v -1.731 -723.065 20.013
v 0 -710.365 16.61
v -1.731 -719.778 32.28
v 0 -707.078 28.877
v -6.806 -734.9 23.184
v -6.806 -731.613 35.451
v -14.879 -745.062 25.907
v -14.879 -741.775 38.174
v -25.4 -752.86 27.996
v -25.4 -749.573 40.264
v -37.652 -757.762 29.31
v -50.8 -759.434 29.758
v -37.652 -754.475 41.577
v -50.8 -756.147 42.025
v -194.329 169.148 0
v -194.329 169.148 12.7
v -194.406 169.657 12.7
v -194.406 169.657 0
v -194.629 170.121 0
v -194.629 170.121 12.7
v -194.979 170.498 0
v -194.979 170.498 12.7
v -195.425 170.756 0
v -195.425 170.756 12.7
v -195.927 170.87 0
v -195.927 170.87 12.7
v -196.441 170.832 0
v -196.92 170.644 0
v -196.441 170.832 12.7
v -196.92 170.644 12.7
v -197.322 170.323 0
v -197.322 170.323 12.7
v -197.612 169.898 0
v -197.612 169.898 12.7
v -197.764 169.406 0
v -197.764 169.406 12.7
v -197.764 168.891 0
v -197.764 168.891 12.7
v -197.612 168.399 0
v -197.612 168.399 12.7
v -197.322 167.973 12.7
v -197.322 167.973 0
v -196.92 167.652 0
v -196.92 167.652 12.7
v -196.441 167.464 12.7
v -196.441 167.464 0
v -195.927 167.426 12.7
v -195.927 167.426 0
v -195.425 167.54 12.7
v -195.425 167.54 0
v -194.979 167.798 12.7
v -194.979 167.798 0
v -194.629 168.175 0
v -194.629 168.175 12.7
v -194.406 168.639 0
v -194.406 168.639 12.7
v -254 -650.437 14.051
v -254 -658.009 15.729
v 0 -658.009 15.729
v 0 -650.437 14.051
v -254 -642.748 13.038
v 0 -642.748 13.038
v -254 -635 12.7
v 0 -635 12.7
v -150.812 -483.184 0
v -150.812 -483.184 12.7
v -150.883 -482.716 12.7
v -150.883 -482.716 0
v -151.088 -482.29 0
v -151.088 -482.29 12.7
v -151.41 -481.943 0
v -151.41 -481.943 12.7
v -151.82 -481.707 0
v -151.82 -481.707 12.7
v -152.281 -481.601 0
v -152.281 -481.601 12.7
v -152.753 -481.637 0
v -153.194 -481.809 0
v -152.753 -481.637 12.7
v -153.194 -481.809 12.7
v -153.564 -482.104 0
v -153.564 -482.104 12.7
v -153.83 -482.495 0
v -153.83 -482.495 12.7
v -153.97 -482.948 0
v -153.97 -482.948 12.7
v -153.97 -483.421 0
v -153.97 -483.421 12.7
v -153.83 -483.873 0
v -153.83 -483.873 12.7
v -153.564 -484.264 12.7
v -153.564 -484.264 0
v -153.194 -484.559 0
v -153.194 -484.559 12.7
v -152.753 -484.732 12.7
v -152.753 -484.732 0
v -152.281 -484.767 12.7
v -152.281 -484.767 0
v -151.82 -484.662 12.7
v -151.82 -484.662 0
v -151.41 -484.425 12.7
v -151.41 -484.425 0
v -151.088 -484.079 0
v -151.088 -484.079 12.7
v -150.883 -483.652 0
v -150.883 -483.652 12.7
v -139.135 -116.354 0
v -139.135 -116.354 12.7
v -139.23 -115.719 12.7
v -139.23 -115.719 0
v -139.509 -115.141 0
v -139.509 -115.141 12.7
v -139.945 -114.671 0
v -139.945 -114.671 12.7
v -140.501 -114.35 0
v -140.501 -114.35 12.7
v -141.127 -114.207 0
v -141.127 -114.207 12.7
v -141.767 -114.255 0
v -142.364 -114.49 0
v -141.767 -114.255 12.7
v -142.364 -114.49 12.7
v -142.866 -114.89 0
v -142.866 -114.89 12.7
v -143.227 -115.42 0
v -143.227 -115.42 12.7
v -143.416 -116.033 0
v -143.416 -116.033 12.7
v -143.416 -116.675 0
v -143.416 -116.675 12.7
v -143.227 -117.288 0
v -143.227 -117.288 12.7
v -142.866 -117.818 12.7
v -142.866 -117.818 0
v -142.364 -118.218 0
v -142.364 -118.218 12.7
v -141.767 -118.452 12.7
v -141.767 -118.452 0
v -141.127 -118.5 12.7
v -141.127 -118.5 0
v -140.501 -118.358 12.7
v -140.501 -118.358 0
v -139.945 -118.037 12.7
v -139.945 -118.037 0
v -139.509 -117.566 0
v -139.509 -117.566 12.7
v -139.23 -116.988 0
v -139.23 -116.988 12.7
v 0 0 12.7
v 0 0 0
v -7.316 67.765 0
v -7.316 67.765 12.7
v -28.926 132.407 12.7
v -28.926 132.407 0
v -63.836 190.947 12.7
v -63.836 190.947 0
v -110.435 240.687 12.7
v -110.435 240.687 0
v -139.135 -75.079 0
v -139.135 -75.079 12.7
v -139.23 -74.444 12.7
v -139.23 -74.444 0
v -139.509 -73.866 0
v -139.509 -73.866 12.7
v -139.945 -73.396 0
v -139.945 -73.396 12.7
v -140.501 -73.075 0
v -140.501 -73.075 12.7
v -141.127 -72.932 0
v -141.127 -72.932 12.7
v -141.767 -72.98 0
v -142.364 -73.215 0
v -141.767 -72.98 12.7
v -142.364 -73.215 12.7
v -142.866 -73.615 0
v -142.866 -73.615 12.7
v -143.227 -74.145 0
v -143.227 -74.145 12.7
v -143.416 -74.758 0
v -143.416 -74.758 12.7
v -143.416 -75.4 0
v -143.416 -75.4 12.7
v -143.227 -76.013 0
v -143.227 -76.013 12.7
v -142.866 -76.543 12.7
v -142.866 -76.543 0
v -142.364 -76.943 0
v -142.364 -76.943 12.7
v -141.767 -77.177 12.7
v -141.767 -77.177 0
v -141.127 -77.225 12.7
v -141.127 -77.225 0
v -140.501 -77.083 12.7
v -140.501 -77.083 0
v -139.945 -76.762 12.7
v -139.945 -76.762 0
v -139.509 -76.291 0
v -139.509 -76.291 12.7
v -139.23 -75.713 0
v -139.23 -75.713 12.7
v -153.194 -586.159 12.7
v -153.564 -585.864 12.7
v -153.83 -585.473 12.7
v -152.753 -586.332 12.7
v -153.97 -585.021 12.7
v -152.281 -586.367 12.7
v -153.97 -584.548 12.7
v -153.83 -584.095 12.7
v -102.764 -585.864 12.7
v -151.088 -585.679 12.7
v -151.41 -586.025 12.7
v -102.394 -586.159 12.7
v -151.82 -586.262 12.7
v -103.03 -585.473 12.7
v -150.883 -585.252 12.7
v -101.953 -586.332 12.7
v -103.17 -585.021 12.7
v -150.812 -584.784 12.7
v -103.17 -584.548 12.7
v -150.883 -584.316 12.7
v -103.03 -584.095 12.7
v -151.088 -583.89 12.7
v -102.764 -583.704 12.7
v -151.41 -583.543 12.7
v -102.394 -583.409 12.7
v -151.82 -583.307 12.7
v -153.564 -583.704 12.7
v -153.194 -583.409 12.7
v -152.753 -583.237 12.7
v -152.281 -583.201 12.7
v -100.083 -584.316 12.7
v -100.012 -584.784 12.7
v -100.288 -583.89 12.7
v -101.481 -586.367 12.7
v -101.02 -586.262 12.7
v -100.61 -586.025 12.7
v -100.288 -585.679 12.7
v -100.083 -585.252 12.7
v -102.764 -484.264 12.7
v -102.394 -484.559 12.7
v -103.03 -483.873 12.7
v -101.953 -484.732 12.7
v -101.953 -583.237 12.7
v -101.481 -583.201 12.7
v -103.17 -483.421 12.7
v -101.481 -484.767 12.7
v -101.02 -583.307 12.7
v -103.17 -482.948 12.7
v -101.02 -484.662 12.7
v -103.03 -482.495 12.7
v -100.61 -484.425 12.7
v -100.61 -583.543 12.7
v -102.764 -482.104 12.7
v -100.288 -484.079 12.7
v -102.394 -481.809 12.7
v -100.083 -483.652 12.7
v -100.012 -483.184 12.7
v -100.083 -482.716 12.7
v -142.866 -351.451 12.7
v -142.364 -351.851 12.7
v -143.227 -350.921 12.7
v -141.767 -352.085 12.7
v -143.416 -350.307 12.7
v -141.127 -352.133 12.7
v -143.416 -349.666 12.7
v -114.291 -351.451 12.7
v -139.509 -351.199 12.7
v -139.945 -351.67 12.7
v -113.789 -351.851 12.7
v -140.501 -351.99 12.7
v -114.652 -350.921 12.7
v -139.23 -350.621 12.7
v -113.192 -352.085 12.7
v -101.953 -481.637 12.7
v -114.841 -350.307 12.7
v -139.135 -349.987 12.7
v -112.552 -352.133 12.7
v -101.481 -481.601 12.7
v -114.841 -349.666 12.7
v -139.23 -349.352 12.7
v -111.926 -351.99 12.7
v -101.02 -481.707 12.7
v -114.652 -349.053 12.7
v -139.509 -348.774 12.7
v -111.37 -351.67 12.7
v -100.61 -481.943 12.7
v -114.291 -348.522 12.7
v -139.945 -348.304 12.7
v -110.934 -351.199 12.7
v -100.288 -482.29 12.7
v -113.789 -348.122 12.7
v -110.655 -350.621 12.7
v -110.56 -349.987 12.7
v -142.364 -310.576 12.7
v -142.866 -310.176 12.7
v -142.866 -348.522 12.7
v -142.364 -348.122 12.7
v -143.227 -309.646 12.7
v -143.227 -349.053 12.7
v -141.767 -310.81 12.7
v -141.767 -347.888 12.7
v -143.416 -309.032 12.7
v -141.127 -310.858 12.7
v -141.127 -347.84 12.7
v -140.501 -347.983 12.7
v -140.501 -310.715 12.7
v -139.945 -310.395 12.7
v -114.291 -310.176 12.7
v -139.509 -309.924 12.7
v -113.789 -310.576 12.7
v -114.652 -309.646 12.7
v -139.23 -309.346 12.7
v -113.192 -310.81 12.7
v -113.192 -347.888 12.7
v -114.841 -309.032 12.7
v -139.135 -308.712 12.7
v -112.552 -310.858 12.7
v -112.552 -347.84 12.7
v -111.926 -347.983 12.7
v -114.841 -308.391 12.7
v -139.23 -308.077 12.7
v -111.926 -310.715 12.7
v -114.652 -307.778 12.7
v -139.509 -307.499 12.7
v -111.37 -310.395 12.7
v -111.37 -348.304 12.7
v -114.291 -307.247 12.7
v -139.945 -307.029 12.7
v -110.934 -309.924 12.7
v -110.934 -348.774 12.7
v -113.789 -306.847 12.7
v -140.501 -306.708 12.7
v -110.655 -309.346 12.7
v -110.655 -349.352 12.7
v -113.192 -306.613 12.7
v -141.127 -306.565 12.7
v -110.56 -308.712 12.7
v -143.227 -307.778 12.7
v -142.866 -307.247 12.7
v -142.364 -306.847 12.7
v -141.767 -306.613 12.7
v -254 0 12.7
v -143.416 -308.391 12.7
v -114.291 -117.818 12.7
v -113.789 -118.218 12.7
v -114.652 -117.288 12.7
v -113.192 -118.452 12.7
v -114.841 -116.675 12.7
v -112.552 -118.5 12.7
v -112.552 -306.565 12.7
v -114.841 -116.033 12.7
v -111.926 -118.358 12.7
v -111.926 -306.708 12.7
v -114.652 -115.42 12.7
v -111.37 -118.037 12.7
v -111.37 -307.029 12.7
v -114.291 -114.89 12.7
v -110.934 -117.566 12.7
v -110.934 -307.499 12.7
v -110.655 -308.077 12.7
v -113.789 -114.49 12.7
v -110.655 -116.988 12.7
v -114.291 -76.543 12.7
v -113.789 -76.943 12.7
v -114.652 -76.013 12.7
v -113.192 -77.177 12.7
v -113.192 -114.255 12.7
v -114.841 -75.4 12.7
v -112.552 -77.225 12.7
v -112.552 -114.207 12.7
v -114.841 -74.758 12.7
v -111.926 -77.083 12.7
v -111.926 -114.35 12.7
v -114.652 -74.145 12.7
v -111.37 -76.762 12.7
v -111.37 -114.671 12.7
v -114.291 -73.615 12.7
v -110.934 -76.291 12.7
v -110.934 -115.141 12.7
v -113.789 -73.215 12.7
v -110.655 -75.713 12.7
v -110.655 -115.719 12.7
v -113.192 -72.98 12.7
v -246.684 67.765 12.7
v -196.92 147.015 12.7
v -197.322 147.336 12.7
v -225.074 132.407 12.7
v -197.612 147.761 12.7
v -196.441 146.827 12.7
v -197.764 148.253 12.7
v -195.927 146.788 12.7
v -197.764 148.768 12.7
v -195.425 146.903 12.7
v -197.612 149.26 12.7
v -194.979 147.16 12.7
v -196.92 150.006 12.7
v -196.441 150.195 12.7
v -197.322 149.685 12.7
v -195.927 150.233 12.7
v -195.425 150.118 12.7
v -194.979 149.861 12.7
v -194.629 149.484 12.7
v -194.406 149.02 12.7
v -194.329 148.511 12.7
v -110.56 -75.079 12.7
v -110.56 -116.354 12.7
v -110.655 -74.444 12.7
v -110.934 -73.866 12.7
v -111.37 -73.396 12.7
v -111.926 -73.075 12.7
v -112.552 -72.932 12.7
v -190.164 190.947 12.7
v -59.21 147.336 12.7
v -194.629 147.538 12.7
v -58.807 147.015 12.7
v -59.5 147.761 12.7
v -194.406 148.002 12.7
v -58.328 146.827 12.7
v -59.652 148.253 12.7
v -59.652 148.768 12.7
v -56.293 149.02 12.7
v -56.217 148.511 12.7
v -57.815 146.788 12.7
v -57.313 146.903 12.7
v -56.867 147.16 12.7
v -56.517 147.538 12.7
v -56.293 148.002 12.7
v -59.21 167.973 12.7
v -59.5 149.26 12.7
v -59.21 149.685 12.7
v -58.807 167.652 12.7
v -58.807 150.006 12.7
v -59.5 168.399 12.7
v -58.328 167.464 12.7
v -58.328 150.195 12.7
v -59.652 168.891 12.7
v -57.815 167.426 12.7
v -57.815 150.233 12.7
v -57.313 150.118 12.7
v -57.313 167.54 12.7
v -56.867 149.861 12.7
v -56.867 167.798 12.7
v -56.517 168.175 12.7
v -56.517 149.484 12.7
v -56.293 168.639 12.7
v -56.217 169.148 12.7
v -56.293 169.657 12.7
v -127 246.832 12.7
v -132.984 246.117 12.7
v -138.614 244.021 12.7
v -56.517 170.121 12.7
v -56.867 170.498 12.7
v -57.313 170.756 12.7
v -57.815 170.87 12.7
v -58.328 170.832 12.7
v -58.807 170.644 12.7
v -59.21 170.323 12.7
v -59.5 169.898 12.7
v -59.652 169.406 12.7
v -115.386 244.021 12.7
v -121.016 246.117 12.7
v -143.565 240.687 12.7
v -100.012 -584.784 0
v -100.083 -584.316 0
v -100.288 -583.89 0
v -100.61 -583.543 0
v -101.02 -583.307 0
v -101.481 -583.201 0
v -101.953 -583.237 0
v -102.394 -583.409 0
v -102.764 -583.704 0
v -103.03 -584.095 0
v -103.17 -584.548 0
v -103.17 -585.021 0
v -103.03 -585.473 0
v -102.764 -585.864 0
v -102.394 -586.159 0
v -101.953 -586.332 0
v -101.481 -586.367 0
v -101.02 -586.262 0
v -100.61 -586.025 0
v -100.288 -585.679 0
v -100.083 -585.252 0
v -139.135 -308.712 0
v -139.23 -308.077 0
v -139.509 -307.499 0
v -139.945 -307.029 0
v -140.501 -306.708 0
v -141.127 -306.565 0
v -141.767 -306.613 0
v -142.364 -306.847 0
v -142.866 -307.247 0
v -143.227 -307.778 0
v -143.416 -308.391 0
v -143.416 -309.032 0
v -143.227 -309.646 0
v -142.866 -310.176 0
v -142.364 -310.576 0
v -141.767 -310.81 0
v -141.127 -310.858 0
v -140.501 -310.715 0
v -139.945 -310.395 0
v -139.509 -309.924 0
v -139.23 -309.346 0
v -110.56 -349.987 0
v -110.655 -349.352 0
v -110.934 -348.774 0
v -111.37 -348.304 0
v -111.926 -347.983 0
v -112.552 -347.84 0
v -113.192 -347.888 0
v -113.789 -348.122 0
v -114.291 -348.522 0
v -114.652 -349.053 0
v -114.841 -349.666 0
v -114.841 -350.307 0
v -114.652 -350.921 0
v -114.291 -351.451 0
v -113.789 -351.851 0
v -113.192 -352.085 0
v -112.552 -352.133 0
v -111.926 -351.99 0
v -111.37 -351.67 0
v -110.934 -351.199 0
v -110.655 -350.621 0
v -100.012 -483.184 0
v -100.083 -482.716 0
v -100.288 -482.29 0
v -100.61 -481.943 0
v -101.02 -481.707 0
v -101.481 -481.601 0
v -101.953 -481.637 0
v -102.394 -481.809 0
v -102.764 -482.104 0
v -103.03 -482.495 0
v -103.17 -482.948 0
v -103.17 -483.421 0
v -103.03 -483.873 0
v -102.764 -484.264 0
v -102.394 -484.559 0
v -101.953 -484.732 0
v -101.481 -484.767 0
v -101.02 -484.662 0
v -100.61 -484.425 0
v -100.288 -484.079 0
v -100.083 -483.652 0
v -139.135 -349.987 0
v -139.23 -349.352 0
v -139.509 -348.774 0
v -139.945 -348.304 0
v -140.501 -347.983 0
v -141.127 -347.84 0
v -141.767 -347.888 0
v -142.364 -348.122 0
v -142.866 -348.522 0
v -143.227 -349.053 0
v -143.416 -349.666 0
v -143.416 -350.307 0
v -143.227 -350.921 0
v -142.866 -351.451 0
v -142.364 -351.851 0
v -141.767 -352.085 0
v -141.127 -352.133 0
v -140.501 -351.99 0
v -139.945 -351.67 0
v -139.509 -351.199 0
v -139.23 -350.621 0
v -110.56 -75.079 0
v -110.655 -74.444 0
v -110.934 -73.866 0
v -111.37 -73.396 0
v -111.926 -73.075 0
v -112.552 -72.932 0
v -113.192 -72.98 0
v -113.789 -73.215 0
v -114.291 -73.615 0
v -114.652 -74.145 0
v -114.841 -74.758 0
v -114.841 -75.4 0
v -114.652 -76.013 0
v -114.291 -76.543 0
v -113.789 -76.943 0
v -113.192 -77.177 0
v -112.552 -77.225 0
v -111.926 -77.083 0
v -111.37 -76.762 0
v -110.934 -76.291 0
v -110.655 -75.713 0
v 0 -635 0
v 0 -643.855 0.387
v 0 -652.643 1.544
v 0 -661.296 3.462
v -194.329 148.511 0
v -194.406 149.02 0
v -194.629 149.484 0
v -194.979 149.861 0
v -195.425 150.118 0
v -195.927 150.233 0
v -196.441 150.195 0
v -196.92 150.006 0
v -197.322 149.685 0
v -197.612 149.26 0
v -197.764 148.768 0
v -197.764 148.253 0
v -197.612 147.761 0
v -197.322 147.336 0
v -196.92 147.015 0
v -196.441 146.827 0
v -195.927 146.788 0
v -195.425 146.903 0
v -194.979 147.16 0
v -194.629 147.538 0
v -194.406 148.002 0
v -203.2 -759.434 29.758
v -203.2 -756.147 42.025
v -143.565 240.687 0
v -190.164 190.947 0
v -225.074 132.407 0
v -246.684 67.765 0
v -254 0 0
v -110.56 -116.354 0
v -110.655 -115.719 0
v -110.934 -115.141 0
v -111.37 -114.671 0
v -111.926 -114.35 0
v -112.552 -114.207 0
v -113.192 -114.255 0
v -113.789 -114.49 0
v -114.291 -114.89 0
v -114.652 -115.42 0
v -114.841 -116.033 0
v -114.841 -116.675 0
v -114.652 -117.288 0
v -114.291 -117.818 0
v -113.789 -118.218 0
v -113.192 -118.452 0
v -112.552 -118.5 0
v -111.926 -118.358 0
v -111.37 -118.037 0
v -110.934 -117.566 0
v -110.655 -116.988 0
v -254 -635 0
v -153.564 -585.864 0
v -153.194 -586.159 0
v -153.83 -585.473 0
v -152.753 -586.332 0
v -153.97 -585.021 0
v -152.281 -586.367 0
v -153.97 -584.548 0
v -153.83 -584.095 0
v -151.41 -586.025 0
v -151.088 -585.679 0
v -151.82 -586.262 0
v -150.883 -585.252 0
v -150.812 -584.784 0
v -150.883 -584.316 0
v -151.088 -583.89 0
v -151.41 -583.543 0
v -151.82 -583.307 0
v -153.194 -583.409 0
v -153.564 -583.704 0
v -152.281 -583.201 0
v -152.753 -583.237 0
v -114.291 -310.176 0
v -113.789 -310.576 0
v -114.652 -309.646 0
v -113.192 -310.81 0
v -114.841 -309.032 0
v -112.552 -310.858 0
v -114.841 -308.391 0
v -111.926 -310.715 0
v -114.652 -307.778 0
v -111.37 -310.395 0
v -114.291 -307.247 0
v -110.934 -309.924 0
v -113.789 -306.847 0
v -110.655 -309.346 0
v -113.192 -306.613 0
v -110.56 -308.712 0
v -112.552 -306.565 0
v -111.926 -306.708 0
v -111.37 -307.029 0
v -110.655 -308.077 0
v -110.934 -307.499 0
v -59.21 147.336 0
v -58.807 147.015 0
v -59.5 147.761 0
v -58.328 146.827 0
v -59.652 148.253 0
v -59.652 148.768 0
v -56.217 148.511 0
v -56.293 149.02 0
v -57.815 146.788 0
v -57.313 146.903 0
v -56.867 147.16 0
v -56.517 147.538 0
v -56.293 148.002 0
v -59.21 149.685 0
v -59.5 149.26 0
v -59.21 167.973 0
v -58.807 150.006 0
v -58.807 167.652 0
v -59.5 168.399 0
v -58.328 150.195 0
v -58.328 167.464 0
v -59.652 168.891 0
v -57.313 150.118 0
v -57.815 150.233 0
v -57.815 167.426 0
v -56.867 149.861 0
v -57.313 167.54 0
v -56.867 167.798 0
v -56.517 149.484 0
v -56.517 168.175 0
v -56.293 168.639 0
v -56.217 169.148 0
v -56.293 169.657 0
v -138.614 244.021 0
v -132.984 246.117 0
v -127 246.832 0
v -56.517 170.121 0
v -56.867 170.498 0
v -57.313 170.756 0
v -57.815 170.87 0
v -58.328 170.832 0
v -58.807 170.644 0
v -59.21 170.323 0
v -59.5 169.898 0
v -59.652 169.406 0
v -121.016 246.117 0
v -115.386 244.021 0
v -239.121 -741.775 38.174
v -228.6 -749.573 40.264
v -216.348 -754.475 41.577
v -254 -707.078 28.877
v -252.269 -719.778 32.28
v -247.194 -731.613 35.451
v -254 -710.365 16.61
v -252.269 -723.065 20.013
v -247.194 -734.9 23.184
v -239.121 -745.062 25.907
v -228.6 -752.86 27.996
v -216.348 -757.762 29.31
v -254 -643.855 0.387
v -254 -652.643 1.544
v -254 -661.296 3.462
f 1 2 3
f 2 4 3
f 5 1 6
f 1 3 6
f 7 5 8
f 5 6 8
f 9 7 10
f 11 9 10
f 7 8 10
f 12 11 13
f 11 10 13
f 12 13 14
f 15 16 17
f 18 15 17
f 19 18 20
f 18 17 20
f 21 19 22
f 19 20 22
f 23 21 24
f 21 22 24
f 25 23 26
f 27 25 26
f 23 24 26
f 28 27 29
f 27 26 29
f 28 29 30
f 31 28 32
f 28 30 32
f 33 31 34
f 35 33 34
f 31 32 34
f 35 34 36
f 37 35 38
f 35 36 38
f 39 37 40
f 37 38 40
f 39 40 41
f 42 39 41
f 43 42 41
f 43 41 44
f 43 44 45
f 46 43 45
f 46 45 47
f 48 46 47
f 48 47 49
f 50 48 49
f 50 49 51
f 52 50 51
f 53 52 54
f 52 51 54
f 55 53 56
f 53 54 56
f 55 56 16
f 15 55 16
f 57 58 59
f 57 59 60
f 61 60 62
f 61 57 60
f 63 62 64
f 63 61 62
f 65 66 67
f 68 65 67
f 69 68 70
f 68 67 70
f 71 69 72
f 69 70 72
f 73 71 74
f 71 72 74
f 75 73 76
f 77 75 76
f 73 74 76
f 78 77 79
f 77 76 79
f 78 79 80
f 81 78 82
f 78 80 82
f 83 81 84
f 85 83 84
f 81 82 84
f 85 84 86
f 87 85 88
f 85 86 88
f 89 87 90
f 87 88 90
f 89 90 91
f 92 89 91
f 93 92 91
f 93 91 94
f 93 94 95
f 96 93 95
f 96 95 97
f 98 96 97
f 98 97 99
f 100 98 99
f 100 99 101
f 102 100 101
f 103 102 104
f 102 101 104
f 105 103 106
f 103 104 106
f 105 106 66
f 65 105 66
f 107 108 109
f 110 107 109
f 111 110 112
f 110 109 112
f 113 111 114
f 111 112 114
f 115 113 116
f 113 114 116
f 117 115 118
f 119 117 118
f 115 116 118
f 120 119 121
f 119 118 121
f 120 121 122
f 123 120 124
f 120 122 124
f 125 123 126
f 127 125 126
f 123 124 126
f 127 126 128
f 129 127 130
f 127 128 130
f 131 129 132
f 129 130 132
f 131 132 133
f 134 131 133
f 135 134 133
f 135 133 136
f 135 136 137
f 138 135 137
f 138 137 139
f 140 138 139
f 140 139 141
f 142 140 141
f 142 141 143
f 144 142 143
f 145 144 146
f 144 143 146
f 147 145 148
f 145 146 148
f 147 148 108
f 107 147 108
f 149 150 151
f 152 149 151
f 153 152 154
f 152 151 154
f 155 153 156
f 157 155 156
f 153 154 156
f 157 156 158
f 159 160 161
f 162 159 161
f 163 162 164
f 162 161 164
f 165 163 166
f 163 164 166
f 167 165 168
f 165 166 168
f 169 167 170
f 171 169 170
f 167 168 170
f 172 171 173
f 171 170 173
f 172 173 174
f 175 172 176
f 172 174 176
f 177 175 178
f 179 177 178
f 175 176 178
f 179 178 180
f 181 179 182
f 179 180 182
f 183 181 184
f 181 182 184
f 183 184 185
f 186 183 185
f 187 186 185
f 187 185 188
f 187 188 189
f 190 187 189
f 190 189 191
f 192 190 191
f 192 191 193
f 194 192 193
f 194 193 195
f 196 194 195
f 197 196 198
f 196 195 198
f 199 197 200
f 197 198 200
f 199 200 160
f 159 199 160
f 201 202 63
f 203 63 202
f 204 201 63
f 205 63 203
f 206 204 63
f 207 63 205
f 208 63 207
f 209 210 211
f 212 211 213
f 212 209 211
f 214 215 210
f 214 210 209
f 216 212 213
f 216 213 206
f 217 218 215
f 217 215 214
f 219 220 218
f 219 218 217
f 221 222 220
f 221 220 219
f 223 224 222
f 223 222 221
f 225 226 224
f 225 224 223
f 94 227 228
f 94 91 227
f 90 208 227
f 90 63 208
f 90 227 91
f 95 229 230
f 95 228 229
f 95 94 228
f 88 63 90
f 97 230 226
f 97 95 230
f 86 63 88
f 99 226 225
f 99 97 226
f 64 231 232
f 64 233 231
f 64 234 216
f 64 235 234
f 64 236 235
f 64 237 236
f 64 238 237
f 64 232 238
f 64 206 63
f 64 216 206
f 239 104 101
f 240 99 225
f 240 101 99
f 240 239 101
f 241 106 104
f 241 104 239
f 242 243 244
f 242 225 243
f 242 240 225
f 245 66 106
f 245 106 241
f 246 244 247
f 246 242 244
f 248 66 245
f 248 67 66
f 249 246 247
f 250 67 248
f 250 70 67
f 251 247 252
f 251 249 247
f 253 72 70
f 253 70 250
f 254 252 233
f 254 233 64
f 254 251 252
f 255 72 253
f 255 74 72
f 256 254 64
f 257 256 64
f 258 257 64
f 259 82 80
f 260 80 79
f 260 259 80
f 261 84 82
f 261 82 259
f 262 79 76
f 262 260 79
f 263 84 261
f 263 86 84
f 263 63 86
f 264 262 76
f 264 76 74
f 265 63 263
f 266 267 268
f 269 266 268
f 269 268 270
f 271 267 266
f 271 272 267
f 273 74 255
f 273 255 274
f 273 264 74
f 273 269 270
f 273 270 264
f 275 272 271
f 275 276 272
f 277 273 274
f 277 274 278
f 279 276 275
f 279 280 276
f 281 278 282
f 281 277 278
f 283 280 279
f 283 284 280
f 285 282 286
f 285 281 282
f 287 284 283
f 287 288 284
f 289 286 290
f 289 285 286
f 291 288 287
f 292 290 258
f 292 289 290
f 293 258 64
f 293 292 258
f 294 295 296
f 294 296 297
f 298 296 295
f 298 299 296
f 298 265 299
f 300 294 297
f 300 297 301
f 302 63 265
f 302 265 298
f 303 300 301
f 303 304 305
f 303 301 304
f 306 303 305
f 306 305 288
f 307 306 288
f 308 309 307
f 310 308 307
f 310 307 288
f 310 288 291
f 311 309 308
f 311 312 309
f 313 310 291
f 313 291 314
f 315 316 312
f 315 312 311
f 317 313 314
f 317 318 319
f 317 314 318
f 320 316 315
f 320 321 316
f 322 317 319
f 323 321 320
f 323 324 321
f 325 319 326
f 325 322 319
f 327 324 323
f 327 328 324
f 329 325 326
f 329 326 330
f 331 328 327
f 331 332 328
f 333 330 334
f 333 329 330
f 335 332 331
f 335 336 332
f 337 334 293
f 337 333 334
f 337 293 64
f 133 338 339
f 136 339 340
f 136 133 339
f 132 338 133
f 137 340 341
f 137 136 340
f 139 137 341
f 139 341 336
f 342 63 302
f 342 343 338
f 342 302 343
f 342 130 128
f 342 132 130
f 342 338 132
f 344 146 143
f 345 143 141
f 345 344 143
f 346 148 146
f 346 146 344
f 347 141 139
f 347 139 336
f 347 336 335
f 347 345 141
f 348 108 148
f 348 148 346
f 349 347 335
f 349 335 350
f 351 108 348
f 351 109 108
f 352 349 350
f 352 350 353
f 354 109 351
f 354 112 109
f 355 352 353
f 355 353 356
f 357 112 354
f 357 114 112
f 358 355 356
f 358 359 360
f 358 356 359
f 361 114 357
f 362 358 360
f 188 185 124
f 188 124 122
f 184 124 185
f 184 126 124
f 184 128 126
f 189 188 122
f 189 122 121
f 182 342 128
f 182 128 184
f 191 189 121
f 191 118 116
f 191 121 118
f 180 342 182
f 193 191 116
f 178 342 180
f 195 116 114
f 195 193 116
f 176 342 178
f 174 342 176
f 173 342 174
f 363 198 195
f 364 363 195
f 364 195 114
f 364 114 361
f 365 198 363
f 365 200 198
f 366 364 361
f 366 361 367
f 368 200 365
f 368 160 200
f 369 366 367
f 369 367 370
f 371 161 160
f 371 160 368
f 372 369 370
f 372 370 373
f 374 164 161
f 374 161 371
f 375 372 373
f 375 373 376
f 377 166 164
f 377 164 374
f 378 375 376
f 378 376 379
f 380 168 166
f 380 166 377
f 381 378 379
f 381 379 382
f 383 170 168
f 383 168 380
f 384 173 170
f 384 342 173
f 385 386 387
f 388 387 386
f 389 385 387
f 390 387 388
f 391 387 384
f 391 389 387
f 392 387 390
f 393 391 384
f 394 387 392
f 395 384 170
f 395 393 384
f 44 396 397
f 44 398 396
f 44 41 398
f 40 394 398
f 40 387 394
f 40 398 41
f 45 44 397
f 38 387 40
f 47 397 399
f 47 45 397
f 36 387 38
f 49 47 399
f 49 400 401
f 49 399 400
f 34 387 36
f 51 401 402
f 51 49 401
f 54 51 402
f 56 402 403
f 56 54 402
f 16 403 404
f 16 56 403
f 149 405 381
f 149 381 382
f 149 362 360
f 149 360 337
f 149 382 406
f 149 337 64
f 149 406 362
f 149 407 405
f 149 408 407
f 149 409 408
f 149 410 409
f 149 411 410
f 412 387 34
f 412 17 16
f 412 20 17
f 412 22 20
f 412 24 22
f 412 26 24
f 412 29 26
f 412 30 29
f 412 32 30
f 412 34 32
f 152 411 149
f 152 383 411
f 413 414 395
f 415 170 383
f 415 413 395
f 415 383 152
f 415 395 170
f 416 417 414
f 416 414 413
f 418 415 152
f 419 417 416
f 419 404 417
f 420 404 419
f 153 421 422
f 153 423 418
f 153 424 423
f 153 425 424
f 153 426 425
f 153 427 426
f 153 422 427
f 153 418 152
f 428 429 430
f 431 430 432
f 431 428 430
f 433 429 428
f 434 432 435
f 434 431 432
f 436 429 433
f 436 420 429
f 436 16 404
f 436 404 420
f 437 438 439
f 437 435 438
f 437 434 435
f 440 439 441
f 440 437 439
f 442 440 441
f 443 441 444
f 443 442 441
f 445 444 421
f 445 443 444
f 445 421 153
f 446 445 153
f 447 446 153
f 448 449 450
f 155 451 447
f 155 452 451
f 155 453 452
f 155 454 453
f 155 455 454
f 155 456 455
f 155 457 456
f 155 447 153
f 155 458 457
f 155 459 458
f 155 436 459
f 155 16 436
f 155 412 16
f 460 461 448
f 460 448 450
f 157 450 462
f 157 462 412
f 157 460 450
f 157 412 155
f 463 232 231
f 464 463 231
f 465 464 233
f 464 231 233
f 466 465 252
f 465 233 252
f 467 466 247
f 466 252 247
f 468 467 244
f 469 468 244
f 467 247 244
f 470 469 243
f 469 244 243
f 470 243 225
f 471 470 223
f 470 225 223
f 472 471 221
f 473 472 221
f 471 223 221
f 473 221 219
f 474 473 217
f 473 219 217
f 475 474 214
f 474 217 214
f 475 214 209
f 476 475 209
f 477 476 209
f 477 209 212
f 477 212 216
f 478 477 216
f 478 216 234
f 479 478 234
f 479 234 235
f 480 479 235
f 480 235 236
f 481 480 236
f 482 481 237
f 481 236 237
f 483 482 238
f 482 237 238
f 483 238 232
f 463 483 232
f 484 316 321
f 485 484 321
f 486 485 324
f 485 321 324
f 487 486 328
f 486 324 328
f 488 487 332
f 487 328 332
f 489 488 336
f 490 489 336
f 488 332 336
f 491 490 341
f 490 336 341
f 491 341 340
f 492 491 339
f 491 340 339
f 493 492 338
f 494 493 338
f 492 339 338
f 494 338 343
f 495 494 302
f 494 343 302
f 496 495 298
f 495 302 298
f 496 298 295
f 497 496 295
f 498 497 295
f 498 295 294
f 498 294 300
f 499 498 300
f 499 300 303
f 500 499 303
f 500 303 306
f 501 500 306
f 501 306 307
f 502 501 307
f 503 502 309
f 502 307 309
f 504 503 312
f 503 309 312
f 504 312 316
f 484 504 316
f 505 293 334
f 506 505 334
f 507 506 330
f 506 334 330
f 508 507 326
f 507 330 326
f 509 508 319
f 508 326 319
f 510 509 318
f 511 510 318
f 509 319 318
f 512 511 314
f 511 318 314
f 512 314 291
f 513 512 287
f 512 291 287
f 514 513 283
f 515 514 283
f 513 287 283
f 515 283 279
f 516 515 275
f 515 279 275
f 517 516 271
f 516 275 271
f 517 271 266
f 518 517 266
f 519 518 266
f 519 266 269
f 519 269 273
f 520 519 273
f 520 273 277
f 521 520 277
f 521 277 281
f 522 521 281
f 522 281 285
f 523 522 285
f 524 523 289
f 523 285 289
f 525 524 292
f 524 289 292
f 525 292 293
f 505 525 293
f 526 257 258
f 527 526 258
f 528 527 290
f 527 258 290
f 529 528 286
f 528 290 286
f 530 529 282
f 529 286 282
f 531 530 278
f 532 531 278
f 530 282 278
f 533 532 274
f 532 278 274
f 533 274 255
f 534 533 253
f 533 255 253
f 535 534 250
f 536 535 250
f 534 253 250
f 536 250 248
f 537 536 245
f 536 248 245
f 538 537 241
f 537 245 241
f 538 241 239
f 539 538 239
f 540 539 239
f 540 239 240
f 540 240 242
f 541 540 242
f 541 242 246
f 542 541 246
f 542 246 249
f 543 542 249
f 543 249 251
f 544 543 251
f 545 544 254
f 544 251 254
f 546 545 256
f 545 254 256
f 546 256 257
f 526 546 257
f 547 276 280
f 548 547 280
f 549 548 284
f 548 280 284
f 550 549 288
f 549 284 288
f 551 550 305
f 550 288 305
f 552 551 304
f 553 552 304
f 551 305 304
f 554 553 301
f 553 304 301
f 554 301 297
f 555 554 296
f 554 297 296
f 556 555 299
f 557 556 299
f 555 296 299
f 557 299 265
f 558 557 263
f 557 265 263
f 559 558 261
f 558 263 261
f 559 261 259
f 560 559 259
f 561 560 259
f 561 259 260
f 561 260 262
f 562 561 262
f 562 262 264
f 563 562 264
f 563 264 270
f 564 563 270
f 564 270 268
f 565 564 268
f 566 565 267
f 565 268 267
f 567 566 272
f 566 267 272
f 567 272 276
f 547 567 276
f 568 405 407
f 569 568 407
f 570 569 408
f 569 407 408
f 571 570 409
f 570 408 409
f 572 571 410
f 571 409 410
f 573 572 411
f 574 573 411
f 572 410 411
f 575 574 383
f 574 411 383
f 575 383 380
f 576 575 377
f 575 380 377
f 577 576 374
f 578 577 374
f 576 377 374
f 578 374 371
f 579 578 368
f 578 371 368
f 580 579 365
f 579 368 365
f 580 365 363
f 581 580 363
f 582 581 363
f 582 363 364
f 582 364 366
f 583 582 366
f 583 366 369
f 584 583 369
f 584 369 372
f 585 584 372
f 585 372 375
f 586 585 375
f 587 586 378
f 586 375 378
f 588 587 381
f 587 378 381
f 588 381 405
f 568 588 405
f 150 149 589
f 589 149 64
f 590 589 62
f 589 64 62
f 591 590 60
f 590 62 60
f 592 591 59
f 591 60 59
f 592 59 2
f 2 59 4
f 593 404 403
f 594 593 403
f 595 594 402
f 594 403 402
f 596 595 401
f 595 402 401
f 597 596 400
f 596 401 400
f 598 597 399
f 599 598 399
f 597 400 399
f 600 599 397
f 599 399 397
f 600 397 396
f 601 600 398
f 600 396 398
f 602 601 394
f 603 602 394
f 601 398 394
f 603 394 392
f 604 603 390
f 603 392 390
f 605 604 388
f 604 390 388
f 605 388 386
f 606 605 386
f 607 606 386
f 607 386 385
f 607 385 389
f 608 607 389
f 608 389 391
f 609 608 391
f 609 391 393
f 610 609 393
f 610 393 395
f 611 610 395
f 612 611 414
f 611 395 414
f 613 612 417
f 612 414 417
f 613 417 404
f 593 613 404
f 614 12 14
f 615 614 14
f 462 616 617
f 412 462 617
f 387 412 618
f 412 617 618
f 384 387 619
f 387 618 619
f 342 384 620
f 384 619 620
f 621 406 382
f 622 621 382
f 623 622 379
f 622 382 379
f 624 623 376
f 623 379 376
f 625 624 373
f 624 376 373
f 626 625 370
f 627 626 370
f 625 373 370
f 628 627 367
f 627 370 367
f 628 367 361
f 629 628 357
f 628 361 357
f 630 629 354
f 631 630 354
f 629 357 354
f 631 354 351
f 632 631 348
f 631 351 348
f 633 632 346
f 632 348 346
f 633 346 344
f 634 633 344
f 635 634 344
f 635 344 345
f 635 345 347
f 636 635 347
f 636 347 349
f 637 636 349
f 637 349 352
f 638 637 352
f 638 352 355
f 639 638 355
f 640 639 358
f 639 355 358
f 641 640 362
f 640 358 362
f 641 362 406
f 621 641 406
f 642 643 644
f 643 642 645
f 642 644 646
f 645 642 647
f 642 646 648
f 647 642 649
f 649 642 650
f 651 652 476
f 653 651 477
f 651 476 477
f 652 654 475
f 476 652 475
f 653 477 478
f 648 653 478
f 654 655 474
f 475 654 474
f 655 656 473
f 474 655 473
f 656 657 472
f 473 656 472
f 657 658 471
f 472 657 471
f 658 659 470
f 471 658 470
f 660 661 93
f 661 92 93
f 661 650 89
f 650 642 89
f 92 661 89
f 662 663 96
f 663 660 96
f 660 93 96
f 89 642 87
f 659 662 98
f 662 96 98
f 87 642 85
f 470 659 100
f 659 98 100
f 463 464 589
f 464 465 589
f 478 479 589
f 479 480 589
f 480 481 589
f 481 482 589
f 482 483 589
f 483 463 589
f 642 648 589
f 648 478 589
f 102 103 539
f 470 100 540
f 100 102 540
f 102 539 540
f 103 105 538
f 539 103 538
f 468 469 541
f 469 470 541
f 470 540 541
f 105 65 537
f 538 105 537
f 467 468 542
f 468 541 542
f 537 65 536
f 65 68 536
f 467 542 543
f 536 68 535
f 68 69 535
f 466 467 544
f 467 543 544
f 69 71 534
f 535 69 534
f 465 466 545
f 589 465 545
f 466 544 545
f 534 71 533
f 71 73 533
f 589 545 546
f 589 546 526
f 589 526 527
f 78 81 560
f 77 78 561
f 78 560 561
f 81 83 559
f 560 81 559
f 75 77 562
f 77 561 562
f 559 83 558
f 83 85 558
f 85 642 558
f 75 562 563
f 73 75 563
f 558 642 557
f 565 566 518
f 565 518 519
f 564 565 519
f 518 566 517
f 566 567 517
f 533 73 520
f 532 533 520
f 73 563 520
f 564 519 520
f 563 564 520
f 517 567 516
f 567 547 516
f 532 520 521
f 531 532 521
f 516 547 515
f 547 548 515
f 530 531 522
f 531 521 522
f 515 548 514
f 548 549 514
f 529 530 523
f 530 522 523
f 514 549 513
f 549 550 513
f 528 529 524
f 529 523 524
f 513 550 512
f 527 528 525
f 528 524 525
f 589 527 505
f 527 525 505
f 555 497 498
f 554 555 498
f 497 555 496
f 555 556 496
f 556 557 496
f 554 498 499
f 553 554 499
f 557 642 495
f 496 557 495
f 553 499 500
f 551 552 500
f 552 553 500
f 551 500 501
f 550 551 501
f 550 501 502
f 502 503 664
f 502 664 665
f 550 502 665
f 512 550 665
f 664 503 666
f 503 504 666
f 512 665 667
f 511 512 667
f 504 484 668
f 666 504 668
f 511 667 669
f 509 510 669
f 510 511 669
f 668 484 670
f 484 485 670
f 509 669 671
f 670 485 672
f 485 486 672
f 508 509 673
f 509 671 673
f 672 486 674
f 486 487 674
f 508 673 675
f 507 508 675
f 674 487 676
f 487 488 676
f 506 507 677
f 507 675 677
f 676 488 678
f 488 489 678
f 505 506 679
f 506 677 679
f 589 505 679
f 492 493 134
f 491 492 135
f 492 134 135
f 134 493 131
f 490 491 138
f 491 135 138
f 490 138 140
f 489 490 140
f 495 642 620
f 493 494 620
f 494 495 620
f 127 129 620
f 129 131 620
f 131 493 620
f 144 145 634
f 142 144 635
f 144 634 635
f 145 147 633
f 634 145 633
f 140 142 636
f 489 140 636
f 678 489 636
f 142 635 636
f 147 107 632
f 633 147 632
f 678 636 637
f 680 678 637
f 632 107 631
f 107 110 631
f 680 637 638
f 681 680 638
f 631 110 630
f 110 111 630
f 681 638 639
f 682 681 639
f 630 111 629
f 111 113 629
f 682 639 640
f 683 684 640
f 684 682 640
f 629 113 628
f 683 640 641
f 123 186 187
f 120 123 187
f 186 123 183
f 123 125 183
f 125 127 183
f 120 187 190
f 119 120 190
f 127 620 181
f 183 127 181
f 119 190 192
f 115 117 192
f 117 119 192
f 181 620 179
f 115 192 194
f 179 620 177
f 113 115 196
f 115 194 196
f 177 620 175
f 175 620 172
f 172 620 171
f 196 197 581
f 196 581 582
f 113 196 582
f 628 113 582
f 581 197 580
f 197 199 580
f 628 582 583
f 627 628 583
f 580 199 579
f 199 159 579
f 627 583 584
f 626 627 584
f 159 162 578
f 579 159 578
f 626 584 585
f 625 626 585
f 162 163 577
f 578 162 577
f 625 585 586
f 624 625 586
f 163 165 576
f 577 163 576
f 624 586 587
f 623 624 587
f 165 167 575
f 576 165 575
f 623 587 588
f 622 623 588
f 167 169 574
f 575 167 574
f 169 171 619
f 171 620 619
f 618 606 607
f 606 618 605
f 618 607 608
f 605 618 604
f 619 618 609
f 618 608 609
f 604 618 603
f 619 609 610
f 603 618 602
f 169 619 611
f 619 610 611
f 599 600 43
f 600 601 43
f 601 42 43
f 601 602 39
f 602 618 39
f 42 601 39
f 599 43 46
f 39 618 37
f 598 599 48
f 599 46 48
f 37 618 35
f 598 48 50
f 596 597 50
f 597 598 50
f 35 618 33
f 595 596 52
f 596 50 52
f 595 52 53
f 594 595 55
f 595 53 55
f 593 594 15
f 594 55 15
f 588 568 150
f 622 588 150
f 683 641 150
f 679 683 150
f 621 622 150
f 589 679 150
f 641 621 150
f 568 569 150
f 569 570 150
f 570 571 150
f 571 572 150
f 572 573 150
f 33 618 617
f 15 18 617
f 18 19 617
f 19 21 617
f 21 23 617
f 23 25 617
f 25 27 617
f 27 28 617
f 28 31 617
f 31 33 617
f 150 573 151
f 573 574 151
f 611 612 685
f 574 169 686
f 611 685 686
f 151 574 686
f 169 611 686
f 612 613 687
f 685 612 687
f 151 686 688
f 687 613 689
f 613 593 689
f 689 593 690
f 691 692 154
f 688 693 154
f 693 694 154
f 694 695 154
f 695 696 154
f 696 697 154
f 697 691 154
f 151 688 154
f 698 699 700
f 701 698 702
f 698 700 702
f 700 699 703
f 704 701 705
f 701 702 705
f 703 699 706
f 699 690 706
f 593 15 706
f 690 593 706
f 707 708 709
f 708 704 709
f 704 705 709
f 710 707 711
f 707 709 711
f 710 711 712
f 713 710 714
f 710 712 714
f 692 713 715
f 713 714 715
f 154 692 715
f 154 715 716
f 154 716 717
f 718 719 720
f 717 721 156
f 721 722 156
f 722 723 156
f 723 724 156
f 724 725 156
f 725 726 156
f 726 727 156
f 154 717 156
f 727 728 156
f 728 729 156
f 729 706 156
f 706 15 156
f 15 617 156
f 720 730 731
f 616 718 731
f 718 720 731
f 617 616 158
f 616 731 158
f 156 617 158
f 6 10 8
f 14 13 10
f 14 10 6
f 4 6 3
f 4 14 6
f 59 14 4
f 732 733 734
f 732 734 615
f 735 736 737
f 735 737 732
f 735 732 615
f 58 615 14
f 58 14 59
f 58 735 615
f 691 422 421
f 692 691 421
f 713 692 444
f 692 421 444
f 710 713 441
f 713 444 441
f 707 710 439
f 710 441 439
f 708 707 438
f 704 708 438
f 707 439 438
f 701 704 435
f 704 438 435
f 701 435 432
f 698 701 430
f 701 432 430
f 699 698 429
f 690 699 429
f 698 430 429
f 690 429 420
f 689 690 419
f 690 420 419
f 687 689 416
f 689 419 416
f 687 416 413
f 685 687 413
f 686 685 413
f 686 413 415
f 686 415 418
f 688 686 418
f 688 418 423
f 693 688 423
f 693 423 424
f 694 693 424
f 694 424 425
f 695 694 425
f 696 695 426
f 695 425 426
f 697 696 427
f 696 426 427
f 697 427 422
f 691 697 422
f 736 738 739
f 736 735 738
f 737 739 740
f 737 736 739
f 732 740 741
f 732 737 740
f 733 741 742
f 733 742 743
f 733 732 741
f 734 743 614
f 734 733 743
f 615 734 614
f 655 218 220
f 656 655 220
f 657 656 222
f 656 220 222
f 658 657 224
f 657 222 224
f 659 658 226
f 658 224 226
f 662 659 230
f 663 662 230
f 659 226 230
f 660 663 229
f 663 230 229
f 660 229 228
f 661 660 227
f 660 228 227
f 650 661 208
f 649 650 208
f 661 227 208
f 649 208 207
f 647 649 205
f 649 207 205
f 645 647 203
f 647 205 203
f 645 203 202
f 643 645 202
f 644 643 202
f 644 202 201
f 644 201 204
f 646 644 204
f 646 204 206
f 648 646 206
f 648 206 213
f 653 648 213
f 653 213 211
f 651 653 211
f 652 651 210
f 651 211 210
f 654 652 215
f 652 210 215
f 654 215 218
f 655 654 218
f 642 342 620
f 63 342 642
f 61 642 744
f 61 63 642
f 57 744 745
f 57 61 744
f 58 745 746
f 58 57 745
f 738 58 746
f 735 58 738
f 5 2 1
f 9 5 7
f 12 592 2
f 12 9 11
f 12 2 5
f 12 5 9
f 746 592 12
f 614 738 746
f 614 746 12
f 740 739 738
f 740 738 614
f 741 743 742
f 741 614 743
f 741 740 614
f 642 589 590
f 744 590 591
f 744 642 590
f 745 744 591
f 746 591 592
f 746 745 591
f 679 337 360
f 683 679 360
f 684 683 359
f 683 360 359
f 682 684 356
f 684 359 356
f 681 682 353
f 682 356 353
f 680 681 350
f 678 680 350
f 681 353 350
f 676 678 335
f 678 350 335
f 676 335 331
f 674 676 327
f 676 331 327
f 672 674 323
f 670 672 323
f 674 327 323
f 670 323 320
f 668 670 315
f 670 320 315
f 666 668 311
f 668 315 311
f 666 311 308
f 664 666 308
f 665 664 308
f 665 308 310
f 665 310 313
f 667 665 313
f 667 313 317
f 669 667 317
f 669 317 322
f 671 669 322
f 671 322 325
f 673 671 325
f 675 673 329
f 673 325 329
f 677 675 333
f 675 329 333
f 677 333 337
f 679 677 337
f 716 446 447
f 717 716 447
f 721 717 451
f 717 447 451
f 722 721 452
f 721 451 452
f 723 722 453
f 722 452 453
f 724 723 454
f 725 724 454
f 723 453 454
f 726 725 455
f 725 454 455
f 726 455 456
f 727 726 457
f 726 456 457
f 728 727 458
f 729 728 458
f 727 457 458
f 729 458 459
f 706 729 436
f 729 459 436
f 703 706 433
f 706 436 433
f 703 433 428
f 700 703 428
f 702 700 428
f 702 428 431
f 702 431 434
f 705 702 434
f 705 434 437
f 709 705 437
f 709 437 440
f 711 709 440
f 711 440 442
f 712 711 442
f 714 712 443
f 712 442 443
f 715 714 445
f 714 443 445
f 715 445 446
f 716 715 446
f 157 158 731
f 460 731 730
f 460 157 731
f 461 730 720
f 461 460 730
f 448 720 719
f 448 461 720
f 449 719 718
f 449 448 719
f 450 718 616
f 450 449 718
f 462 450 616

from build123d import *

# Parameters (mm, degrees)
F1_DEPTH = 12.7
F2_R     = 25.4
F4_DEPTH = 254
F5_R     = 50.8
F6_R     = 2.15265
F6_R_2   = 1.5875
F6_R_3   = 1.7272
F7_DEPTH = 12.7


with BuildPart() as f1:
    # F0 (on Top) → F1 (new body)
    with BuildSketch(Plane.XY):
        with BuildLine():
            Line((-254, -635), (0, -635))
            Line((0, -635), (0, 0))
            ThreePointArc((0, 0), (-33.5193668575, 141.9903165712), (-127, 254))
            ThreePointArc((-127, 254), (-220.4806331425, 141.9903165712), (-254, 0))
            Line((-254, 0), (-254, -635))
        make_face()
    extrude(amount=F1_DEPTH)

    # F2
    f2_edges = [f1.edges().sort_by_distance(p)[0] for p in [
        (-127, 254, 6.35),
    ]]
    fillet(f2_edges, radius=F2_R)

    # F3 (on face) → F4 (join, through all)
    with BuildSketch(Plane(origin=(-254, 0, 0), x_dir=(0, -1, 0), z_dir=(-1, 0, 0))):
        with BuildLine():
            ThreePointArc((658.0090131096, 15.7291940429), (646.6037784884, 13.4605518239), (635, 12.7))
            Line((635, 12.7), (635, 0))
            ThreePointArc((635, 0), (648.2614611296, 0.8692020844), (661.2960149824, 3.461936049))
            Line((661.2960149824, 3.461936049), (759.4340789334, 29.7579510314))
            Line((759.4340789334, 29.7579510314), (756.1470770606, 42.0252090253))
            Line((756.1470770606, 42.0252090253), (658.0090131096, 15.7291940429))
        make_face()
    extrude(amount=-F4_DEPTH)

    # F5
    f5_edges = [f1.edges().sort_by_distance(p)[0] for p in [
        (0, -757.790578, 35.89158),
        (-254, -757.790578, 35.89158),
    ]]
    fillet(f5_edges, radius=F5_R)

    # F6 (on face) → F7 (cut, through all)
    with BuildSketch(Plane.XY.offset(12.7)):
        with Locations((-112.7125, -308.7116213322)):
            Circle(F6_R)
        with Locations((-141.2875, -308.7116213322)):
            Circle(F6_R)
        with Locations((-101.6, -584.7842693329)):
            Circle(F6_R_2)
        with Locations((-152.4, -584.7842693329)):
            Circle(F6_R_2)
        with Locations((-152.4, -483.1842693329)):
            Circle(F6_R_2)
        with Locations((-101.6, -483.1842693329)):
            Circle(F6_R_2)
        with Locations((-141.2875, -75.0787870646)):
            Circle(F6_R)
        with Locations((-112.7125, -75.0787870646)):
            Circle(F6_R)
        with Locations((-112.7125, -116.3537870646)):
            Circle(F6_R)
        with Locations((-141.2875, -116.3537870646)):
            Circle(F6_R)
        with Locations((-141.2875, -349.9866213322)):
            Circle(F6_R)
        with Locations((-112.7125, -349.9866213322)):
            Circle(F6_R)
        with Locations((-57.94375, 169.1481069684)):
            Circle(F6_R_3)
        with Locations((-57.94375, 148.5106069684)):
            Circle(F6_R_3)
        with Locations((-196.05625, 148.5106069684)):
            Circle(F6_R_3)
        with Locations((-196.05625, 169.1481069684)):
            Circle(F6_R_3)
    extrude(amount=-F7_DEPTH, mode=Mode.SUBTRACT)


solid = f1.part
